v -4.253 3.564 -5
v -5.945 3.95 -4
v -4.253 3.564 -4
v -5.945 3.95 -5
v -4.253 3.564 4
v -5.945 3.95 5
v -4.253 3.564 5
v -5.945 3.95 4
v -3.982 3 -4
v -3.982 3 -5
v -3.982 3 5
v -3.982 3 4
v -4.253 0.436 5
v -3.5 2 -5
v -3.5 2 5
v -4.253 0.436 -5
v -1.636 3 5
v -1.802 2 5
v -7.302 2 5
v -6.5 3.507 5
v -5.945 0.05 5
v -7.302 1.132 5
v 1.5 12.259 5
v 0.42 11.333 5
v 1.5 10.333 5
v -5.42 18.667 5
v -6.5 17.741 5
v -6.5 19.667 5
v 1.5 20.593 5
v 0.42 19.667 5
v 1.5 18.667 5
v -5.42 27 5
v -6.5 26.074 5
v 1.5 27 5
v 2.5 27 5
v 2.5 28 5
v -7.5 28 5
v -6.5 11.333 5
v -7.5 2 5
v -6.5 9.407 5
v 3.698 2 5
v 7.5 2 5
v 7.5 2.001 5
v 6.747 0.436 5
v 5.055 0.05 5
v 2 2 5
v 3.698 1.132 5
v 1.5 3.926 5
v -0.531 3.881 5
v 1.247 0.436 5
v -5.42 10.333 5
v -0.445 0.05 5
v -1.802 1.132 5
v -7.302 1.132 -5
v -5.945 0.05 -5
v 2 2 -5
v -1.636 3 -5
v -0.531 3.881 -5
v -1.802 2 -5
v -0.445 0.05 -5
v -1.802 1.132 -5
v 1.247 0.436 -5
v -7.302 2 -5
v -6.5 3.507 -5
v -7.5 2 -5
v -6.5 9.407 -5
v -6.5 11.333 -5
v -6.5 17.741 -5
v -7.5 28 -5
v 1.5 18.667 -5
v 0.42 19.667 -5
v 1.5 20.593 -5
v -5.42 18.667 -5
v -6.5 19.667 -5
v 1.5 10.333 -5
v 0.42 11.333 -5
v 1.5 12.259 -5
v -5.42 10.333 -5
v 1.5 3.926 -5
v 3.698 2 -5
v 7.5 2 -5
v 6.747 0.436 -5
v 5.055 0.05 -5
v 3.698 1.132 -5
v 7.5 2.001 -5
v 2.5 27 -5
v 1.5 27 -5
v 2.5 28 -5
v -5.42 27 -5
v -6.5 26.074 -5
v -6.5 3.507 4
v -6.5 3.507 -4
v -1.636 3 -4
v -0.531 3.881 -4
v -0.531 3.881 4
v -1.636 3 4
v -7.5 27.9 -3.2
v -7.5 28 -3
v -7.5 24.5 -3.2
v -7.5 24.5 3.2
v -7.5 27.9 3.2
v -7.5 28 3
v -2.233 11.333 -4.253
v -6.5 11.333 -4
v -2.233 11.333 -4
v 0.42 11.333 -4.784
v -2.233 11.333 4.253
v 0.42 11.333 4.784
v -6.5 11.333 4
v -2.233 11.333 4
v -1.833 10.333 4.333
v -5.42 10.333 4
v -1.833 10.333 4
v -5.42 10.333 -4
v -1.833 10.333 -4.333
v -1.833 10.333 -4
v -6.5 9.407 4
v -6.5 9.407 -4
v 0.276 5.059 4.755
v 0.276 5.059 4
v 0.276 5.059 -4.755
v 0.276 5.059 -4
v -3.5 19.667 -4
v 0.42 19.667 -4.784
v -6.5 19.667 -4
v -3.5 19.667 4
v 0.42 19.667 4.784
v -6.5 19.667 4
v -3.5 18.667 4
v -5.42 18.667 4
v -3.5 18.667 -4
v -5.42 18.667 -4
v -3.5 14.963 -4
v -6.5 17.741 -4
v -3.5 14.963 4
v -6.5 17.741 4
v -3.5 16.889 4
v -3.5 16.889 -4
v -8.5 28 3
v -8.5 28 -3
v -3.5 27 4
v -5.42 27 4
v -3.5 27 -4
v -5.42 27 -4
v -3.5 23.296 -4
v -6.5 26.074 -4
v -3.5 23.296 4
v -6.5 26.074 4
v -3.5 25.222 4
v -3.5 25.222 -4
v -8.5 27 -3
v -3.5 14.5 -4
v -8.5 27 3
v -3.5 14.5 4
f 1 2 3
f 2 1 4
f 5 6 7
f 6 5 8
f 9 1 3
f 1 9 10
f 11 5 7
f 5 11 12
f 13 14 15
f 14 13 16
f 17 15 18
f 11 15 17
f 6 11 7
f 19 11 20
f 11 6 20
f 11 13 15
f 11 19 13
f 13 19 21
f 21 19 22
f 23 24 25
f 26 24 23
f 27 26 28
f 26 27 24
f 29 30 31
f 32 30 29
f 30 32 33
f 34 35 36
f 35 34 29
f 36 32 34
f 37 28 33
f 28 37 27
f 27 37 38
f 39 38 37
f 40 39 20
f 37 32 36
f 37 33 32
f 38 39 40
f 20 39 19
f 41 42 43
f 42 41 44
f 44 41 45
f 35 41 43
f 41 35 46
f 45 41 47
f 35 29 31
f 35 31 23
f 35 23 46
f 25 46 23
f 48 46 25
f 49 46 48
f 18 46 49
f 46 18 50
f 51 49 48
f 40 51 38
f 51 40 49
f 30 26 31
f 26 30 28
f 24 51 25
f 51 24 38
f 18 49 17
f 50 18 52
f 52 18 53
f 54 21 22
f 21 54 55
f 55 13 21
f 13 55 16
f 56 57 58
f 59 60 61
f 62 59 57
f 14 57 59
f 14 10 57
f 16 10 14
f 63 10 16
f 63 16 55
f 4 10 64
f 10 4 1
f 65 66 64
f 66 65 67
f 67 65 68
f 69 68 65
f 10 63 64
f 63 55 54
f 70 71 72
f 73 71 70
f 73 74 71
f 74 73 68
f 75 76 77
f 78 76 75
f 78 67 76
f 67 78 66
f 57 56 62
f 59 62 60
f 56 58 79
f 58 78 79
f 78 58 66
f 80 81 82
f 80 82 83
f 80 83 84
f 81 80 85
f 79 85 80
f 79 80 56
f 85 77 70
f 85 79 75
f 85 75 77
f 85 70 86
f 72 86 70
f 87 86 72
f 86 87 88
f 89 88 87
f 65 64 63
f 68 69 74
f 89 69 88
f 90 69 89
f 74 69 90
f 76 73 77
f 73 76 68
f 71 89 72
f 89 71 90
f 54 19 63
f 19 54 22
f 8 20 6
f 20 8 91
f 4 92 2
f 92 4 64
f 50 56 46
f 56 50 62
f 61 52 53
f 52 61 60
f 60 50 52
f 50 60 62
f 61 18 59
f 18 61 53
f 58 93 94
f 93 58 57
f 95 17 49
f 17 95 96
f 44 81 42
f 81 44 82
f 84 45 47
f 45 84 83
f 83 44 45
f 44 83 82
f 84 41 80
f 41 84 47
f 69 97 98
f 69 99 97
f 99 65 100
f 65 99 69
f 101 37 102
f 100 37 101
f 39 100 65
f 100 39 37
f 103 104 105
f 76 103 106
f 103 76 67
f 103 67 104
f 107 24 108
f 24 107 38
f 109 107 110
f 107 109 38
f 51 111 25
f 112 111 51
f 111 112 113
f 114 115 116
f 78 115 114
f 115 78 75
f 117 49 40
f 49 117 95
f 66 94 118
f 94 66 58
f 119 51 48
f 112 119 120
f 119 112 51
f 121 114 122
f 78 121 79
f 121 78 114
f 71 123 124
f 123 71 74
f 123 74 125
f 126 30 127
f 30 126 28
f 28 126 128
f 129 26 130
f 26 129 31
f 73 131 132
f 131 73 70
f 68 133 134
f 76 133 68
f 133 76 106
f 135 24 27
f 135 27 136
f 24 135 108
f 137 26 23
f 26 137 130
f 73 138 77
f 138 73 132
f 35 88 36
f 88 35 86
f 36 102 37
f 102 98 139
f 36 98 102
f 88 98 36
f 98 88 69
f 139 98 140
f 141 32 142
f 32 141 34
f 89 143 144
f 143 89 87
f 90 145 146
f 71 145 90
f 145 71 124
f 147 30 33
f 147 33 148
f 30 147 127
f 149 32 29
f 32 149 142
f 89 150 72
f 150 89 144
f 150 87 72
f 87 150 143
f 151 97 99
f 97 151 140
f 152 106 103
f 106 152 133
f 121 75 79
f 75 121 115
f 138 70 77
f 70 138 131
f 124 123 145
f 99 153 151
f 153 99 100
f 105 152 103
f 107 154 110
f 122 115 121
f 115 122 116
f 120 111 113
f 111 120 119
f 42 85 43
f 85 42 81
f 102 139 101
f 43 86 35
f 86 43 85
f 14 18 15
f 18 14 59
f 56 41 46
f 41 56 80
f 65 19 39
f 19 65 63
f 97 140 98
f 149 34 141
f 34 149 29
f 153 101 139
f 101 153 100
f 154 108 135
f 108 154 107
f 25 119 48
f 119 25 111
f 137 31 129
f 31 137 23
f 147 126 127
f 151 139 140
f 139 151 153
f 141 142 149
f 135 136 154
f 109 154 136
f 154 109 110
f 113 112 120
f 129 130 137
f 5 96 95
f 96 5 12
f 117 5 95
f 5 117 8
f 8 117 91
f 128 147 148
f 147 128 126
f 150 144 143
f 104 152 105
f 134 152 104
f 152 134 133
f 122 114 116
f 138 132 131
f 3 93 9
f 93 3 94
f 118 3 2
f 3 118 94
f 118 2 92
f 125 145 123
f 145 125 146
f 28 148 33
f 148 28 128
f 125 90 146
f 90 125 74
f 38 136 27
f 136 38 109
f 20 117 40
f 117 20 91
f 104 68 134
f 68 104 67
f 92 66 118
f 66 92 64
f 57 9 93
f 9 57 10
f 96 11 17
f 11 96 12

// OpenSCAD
height = 25;

base_of_center_section = 10;

base_of_support_section = 5;

size_of_wood_shapes = 1;

radius_of_wheels = 2;

number_of_levels = 3;

number_of_wheels = 3;

tower(
	height,
	base_of_center_section,
	base_of_support_section,
	size_of_wood_shapes,
	radius_of_wheels,
	number_of_levels,
	number_of_wheels
);

/**
h  = height of the tower
b  = base of the center section
b2 = base of the support zone
s  = size of the wood in the sides
r  = radius of the wheels
hn = number of levels of the tower
wn = number of wheels
*/
module tower(h,b,b2,s,r,hn,wn)
	translate([-(b+b2)/2,r,-b/2]) {
	//Main body of the tower
	hull(){
		translate([b,0,0]) cube([b2,0.001,b]);
		translate([b-s,0,0]) cube([s,h,b]);
		//gate
		translate([-s,h,2*s]) cube([2*s,s,b-4*s]);
	}
	translate([0,0,s])  cube([b,h,b-2*s]);
	cube([s,h,b]);
	//wheels
	for(i = [0:wn-1]){
		translate([r + i*(b+b2-2*r)/(wn-1),0,0])
			cylinder(b,r,r);
	}
	//wood divisions
	cube([b,s,b]);
	for(i = [1:hn]) translate([0,i*h/wn]) {
		cube([b,s,b]);
		hull(){
			cube([s,s,b]);
			translate([b-s,-h/wn,0]) cube([s,s,b]);
		}
	}
	
}
